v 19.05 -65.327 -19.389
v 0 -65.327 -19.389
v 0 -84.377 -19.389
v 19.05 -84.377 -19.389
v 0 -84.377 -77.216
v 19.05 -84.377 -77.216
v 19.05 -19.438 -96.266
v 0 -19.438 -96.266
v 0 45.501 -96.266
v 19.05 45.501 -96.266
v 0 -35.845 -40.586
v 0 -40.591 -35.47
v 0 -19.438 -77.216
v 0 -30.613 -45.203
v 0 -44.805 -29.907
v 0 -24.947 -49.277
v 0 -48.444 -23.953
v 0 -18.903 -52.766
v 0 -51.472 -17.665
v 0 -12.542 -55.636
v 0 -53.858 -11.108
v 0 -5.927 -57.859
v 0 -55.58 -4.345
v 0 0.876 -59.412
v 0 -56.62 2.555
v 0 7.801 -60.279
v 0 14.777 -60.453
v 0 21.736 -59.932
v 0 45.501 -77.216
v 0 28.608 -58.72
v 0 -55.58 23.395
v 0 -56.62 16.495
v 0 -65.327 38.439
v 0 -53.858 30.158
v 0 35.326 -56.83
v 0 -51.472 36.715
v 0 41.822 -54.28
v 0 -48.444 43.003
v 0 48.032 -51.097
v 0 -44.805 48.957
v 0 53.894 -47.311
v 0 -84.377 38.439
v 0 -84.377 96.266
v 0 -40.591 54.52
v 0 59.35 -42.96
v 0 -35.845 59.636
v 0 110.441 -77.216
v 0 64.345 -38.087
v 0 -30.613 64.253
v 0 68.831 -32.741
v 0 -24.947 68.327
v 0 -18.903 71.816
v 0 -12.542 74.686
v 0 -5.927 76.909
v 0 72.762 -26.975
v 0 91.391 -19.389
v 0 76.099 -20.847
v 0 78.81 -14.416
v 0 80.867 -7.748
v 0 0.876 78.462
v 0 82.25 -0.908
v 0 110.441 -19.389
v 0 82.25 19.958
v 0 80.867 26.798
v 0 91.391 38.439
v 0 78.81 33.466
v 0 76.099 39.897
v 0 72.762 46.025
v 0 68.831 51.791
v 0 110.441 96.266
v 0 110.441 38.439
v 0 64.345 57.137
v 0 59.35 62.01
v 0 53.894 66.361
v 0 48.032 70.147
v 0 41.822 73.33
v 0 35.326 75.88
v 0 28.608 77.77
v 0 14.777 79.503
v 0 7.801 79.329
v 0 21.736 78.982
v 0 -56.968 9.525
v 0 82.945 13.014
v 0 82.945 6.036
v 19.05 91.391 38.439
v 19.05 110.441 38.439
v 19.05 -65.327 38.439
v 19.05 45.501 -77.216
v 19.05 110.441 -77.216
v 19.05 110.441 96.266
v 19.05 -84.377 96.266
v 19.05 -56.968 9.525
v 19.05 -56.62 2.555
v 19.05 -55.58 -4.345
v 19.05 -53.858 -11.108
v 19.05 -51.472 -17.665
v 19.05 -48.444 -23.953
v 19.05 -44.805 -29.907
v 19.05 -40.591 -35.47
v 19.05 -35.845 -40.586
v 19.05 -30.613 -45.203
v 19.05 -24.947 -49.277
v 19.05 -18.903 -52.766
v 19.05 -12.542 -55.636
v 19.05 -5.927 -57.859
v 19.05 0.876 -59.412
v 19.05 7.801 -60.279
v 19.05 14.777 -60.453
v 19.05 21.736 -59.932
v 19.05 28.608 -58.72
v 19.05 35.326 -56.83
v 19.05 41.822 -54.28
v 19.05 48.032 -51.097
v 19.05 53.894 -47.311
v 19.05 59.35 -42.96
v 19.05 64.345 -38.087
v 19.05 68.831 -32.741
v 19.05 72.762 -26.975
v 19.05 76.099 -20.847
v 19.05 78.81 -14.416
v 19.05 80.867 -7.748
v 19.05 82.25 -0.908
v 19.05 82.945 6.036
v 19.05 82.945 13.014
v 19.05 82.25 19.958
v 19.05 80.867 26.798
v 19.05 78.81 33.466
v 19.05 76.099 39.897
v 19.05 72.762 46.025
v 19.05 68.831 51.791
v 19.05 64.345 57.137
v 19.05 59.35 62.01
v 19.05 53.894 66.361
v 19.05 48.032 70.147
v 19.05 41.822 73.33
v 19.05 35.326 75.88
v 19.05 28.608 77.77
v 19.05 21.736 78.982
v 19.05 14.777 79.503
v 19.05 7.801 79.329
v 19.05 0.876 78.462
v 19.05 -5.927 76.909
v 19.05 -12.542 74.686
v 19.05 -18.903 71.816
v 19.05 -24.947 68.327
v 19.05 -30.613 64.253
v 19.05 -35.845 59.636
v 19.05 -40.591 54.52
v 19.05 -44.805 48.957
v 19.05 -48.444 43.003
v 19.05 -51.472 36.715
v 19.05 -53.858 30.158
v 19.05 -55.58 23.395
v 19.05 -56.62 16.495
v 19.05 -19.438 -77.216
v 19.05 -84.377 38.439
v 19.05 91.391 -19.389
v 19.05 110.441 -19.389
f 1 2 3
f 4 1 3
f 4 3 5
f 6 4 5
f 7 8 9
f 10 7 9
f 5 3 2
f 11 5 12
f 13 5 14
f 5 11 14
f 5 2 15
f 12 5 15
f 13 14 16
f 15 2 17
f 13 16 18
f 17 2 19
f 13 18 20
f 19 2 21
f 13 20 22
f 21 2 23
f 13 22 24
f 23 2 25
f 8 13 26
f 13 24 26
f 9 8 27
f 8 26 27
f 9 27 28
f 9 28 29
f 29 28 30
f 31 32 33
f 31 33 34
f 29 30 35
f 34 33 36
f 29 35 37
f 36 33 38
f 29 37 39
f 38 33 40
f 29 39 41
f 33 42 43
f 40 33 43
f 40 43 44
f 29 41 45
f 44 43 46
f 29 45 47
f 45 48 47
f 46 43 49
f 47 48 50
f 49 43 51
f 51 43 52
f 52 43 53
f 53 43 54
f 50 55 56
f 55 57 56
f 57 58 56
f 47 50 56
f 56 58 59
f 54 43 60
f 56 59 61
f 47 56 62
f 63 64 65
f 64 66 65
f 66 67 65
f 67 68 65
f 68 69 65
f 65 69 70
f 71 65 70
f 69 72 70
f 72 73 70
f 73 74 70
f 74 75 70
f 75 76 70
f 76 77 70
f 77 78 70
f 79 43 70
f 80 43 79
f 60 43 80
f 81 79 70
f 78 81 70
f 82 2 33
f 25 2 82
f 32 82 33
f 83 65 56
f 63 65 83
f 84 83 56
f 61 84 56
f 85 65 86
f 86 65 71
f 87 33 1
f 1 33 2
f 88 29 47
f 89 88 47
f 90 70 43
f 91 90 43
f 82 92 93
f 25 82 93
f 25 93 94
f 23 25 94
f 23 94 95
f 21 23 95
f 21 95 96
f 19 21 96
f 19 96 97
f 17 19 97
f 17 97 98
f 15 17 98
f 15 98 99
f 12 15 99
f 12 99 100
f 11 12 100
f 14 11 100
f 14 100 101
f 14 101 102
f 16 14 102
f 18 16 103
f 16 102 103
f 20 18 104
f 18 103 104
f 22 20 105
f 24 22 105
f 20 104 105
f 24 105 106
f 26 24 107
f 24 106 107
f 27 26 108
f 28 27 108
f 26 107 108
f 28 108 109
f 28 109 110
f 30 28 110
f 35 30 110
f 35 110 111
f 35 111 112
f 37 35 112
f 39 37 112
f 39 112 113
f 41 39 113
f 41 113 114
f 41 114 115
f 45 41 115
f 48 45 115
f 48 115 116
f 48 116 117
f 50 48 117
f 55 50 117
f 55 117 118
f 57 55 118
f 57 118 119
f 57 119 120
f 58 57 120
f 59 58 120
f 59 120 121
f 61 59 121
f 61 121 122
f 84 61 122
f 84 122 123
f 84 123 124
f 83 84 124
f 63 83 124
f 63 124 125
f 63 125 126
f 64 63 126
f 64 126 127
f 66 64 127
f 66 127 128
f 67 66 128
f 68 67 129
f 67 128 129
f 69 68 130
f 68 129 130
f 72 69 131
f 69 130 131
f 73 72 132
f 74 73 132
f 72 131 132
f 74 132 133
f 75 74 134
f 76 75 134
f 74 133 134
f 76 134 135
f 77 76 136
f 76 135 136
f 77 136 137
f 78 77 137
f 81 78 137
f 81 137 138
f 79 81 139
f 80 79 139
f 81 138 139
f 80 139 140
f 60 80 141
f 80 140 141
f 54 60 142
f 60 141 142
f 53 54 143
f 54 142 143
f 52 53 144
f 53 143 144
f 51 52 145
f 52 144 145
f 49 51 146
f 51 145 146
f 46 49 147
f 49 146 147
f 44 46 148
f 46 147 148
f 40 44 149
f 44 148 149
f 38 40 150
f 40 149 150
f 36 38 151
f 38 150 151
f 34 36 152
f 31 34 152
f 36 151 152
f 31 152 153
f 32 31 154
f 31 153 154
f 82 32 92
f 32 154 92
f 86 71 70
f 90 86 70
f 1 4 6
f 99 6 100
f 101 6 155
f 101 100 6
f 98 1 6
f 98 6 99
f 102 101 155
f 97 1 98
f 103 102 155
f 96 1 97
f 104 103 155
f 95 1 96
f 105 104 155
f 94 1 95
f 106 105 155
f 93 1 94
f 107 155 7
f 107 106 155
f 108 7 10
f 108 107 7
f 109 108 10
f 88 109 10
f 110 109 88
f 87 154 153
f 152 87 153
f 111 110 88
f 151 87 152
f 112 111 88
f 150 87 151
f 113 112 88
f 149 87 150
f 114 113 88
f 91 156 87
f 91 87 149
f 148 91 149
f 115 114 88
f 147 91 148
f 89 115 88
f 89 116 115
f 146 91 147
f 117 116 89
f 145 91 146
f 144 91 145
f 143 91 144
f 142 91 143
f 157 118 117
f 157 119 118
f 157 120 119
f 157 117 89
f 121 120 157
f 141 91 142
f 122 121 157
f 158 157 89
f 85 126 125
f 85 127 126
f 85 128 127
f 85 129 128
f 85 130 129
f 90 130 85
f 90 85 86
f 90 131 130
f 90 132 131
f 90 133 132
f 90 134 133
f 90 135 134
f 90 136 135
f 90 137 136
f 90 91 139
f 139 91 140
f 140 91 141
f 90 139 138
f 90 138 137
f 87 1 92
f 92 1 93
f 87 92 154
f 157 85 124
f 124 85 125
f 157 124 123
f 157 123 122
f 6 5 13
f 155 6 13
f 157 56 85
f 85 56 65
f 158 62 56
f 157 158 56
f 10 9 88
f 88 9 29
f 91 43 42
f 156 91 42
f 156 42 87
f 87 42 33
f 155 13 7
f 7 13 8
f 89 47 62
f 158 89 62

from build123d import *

# Parameters (mm, degrees)
F1_DEPTH = 19.05
F2_D     = 139.999974
F2_DEPTH = 50.8
F2_TIP   = 42.0602355207


with BuildPart() as f1:
    # F0 (on Right) → F1 (new body)
    with BuildSketch(Plane.YZ):
        Polygon((110.4406434166, 38.438666836), (110.4406434166, 96.266), (-84.3773565834, 96.266), (-84.3773565834, 38.438666836), (-65.3273565834, 38.438666836), (-65.3273565834, -19.388666836), (-84.3773565834, -19.388666836), (-84.3773565834, -77.216), (-19.4380147834, -77.216), (-19.4380147834, -96.266), (45.5013016166, -96.266), (45.5013016166, -77.216), (110.4406434166, -77.216), (110.4406434166, -19.388666836), (91.3906434166, -19.388666836), (91.3906434166, 38.438666836), align=None)
    extrude(amount=F1_DEPTH)

    # F2
    with Locations(Plane(origin=(0, 0, 0), x_dir=(0, 1, 0), z_dir=(-1, 0, 0))):
        with Locations((13.0316434166, -9.525)):
            Hole(F2_D / 2, depth=F2_DEPTH)
            with Locations((0, 0, -(F2_DEPTH + F2_TIP / 2))):  # 118° drill point
                Cone(0, F2_D / 2, F2_TIP, mode=Mode.SUBTRACT)


solid = f1.part
